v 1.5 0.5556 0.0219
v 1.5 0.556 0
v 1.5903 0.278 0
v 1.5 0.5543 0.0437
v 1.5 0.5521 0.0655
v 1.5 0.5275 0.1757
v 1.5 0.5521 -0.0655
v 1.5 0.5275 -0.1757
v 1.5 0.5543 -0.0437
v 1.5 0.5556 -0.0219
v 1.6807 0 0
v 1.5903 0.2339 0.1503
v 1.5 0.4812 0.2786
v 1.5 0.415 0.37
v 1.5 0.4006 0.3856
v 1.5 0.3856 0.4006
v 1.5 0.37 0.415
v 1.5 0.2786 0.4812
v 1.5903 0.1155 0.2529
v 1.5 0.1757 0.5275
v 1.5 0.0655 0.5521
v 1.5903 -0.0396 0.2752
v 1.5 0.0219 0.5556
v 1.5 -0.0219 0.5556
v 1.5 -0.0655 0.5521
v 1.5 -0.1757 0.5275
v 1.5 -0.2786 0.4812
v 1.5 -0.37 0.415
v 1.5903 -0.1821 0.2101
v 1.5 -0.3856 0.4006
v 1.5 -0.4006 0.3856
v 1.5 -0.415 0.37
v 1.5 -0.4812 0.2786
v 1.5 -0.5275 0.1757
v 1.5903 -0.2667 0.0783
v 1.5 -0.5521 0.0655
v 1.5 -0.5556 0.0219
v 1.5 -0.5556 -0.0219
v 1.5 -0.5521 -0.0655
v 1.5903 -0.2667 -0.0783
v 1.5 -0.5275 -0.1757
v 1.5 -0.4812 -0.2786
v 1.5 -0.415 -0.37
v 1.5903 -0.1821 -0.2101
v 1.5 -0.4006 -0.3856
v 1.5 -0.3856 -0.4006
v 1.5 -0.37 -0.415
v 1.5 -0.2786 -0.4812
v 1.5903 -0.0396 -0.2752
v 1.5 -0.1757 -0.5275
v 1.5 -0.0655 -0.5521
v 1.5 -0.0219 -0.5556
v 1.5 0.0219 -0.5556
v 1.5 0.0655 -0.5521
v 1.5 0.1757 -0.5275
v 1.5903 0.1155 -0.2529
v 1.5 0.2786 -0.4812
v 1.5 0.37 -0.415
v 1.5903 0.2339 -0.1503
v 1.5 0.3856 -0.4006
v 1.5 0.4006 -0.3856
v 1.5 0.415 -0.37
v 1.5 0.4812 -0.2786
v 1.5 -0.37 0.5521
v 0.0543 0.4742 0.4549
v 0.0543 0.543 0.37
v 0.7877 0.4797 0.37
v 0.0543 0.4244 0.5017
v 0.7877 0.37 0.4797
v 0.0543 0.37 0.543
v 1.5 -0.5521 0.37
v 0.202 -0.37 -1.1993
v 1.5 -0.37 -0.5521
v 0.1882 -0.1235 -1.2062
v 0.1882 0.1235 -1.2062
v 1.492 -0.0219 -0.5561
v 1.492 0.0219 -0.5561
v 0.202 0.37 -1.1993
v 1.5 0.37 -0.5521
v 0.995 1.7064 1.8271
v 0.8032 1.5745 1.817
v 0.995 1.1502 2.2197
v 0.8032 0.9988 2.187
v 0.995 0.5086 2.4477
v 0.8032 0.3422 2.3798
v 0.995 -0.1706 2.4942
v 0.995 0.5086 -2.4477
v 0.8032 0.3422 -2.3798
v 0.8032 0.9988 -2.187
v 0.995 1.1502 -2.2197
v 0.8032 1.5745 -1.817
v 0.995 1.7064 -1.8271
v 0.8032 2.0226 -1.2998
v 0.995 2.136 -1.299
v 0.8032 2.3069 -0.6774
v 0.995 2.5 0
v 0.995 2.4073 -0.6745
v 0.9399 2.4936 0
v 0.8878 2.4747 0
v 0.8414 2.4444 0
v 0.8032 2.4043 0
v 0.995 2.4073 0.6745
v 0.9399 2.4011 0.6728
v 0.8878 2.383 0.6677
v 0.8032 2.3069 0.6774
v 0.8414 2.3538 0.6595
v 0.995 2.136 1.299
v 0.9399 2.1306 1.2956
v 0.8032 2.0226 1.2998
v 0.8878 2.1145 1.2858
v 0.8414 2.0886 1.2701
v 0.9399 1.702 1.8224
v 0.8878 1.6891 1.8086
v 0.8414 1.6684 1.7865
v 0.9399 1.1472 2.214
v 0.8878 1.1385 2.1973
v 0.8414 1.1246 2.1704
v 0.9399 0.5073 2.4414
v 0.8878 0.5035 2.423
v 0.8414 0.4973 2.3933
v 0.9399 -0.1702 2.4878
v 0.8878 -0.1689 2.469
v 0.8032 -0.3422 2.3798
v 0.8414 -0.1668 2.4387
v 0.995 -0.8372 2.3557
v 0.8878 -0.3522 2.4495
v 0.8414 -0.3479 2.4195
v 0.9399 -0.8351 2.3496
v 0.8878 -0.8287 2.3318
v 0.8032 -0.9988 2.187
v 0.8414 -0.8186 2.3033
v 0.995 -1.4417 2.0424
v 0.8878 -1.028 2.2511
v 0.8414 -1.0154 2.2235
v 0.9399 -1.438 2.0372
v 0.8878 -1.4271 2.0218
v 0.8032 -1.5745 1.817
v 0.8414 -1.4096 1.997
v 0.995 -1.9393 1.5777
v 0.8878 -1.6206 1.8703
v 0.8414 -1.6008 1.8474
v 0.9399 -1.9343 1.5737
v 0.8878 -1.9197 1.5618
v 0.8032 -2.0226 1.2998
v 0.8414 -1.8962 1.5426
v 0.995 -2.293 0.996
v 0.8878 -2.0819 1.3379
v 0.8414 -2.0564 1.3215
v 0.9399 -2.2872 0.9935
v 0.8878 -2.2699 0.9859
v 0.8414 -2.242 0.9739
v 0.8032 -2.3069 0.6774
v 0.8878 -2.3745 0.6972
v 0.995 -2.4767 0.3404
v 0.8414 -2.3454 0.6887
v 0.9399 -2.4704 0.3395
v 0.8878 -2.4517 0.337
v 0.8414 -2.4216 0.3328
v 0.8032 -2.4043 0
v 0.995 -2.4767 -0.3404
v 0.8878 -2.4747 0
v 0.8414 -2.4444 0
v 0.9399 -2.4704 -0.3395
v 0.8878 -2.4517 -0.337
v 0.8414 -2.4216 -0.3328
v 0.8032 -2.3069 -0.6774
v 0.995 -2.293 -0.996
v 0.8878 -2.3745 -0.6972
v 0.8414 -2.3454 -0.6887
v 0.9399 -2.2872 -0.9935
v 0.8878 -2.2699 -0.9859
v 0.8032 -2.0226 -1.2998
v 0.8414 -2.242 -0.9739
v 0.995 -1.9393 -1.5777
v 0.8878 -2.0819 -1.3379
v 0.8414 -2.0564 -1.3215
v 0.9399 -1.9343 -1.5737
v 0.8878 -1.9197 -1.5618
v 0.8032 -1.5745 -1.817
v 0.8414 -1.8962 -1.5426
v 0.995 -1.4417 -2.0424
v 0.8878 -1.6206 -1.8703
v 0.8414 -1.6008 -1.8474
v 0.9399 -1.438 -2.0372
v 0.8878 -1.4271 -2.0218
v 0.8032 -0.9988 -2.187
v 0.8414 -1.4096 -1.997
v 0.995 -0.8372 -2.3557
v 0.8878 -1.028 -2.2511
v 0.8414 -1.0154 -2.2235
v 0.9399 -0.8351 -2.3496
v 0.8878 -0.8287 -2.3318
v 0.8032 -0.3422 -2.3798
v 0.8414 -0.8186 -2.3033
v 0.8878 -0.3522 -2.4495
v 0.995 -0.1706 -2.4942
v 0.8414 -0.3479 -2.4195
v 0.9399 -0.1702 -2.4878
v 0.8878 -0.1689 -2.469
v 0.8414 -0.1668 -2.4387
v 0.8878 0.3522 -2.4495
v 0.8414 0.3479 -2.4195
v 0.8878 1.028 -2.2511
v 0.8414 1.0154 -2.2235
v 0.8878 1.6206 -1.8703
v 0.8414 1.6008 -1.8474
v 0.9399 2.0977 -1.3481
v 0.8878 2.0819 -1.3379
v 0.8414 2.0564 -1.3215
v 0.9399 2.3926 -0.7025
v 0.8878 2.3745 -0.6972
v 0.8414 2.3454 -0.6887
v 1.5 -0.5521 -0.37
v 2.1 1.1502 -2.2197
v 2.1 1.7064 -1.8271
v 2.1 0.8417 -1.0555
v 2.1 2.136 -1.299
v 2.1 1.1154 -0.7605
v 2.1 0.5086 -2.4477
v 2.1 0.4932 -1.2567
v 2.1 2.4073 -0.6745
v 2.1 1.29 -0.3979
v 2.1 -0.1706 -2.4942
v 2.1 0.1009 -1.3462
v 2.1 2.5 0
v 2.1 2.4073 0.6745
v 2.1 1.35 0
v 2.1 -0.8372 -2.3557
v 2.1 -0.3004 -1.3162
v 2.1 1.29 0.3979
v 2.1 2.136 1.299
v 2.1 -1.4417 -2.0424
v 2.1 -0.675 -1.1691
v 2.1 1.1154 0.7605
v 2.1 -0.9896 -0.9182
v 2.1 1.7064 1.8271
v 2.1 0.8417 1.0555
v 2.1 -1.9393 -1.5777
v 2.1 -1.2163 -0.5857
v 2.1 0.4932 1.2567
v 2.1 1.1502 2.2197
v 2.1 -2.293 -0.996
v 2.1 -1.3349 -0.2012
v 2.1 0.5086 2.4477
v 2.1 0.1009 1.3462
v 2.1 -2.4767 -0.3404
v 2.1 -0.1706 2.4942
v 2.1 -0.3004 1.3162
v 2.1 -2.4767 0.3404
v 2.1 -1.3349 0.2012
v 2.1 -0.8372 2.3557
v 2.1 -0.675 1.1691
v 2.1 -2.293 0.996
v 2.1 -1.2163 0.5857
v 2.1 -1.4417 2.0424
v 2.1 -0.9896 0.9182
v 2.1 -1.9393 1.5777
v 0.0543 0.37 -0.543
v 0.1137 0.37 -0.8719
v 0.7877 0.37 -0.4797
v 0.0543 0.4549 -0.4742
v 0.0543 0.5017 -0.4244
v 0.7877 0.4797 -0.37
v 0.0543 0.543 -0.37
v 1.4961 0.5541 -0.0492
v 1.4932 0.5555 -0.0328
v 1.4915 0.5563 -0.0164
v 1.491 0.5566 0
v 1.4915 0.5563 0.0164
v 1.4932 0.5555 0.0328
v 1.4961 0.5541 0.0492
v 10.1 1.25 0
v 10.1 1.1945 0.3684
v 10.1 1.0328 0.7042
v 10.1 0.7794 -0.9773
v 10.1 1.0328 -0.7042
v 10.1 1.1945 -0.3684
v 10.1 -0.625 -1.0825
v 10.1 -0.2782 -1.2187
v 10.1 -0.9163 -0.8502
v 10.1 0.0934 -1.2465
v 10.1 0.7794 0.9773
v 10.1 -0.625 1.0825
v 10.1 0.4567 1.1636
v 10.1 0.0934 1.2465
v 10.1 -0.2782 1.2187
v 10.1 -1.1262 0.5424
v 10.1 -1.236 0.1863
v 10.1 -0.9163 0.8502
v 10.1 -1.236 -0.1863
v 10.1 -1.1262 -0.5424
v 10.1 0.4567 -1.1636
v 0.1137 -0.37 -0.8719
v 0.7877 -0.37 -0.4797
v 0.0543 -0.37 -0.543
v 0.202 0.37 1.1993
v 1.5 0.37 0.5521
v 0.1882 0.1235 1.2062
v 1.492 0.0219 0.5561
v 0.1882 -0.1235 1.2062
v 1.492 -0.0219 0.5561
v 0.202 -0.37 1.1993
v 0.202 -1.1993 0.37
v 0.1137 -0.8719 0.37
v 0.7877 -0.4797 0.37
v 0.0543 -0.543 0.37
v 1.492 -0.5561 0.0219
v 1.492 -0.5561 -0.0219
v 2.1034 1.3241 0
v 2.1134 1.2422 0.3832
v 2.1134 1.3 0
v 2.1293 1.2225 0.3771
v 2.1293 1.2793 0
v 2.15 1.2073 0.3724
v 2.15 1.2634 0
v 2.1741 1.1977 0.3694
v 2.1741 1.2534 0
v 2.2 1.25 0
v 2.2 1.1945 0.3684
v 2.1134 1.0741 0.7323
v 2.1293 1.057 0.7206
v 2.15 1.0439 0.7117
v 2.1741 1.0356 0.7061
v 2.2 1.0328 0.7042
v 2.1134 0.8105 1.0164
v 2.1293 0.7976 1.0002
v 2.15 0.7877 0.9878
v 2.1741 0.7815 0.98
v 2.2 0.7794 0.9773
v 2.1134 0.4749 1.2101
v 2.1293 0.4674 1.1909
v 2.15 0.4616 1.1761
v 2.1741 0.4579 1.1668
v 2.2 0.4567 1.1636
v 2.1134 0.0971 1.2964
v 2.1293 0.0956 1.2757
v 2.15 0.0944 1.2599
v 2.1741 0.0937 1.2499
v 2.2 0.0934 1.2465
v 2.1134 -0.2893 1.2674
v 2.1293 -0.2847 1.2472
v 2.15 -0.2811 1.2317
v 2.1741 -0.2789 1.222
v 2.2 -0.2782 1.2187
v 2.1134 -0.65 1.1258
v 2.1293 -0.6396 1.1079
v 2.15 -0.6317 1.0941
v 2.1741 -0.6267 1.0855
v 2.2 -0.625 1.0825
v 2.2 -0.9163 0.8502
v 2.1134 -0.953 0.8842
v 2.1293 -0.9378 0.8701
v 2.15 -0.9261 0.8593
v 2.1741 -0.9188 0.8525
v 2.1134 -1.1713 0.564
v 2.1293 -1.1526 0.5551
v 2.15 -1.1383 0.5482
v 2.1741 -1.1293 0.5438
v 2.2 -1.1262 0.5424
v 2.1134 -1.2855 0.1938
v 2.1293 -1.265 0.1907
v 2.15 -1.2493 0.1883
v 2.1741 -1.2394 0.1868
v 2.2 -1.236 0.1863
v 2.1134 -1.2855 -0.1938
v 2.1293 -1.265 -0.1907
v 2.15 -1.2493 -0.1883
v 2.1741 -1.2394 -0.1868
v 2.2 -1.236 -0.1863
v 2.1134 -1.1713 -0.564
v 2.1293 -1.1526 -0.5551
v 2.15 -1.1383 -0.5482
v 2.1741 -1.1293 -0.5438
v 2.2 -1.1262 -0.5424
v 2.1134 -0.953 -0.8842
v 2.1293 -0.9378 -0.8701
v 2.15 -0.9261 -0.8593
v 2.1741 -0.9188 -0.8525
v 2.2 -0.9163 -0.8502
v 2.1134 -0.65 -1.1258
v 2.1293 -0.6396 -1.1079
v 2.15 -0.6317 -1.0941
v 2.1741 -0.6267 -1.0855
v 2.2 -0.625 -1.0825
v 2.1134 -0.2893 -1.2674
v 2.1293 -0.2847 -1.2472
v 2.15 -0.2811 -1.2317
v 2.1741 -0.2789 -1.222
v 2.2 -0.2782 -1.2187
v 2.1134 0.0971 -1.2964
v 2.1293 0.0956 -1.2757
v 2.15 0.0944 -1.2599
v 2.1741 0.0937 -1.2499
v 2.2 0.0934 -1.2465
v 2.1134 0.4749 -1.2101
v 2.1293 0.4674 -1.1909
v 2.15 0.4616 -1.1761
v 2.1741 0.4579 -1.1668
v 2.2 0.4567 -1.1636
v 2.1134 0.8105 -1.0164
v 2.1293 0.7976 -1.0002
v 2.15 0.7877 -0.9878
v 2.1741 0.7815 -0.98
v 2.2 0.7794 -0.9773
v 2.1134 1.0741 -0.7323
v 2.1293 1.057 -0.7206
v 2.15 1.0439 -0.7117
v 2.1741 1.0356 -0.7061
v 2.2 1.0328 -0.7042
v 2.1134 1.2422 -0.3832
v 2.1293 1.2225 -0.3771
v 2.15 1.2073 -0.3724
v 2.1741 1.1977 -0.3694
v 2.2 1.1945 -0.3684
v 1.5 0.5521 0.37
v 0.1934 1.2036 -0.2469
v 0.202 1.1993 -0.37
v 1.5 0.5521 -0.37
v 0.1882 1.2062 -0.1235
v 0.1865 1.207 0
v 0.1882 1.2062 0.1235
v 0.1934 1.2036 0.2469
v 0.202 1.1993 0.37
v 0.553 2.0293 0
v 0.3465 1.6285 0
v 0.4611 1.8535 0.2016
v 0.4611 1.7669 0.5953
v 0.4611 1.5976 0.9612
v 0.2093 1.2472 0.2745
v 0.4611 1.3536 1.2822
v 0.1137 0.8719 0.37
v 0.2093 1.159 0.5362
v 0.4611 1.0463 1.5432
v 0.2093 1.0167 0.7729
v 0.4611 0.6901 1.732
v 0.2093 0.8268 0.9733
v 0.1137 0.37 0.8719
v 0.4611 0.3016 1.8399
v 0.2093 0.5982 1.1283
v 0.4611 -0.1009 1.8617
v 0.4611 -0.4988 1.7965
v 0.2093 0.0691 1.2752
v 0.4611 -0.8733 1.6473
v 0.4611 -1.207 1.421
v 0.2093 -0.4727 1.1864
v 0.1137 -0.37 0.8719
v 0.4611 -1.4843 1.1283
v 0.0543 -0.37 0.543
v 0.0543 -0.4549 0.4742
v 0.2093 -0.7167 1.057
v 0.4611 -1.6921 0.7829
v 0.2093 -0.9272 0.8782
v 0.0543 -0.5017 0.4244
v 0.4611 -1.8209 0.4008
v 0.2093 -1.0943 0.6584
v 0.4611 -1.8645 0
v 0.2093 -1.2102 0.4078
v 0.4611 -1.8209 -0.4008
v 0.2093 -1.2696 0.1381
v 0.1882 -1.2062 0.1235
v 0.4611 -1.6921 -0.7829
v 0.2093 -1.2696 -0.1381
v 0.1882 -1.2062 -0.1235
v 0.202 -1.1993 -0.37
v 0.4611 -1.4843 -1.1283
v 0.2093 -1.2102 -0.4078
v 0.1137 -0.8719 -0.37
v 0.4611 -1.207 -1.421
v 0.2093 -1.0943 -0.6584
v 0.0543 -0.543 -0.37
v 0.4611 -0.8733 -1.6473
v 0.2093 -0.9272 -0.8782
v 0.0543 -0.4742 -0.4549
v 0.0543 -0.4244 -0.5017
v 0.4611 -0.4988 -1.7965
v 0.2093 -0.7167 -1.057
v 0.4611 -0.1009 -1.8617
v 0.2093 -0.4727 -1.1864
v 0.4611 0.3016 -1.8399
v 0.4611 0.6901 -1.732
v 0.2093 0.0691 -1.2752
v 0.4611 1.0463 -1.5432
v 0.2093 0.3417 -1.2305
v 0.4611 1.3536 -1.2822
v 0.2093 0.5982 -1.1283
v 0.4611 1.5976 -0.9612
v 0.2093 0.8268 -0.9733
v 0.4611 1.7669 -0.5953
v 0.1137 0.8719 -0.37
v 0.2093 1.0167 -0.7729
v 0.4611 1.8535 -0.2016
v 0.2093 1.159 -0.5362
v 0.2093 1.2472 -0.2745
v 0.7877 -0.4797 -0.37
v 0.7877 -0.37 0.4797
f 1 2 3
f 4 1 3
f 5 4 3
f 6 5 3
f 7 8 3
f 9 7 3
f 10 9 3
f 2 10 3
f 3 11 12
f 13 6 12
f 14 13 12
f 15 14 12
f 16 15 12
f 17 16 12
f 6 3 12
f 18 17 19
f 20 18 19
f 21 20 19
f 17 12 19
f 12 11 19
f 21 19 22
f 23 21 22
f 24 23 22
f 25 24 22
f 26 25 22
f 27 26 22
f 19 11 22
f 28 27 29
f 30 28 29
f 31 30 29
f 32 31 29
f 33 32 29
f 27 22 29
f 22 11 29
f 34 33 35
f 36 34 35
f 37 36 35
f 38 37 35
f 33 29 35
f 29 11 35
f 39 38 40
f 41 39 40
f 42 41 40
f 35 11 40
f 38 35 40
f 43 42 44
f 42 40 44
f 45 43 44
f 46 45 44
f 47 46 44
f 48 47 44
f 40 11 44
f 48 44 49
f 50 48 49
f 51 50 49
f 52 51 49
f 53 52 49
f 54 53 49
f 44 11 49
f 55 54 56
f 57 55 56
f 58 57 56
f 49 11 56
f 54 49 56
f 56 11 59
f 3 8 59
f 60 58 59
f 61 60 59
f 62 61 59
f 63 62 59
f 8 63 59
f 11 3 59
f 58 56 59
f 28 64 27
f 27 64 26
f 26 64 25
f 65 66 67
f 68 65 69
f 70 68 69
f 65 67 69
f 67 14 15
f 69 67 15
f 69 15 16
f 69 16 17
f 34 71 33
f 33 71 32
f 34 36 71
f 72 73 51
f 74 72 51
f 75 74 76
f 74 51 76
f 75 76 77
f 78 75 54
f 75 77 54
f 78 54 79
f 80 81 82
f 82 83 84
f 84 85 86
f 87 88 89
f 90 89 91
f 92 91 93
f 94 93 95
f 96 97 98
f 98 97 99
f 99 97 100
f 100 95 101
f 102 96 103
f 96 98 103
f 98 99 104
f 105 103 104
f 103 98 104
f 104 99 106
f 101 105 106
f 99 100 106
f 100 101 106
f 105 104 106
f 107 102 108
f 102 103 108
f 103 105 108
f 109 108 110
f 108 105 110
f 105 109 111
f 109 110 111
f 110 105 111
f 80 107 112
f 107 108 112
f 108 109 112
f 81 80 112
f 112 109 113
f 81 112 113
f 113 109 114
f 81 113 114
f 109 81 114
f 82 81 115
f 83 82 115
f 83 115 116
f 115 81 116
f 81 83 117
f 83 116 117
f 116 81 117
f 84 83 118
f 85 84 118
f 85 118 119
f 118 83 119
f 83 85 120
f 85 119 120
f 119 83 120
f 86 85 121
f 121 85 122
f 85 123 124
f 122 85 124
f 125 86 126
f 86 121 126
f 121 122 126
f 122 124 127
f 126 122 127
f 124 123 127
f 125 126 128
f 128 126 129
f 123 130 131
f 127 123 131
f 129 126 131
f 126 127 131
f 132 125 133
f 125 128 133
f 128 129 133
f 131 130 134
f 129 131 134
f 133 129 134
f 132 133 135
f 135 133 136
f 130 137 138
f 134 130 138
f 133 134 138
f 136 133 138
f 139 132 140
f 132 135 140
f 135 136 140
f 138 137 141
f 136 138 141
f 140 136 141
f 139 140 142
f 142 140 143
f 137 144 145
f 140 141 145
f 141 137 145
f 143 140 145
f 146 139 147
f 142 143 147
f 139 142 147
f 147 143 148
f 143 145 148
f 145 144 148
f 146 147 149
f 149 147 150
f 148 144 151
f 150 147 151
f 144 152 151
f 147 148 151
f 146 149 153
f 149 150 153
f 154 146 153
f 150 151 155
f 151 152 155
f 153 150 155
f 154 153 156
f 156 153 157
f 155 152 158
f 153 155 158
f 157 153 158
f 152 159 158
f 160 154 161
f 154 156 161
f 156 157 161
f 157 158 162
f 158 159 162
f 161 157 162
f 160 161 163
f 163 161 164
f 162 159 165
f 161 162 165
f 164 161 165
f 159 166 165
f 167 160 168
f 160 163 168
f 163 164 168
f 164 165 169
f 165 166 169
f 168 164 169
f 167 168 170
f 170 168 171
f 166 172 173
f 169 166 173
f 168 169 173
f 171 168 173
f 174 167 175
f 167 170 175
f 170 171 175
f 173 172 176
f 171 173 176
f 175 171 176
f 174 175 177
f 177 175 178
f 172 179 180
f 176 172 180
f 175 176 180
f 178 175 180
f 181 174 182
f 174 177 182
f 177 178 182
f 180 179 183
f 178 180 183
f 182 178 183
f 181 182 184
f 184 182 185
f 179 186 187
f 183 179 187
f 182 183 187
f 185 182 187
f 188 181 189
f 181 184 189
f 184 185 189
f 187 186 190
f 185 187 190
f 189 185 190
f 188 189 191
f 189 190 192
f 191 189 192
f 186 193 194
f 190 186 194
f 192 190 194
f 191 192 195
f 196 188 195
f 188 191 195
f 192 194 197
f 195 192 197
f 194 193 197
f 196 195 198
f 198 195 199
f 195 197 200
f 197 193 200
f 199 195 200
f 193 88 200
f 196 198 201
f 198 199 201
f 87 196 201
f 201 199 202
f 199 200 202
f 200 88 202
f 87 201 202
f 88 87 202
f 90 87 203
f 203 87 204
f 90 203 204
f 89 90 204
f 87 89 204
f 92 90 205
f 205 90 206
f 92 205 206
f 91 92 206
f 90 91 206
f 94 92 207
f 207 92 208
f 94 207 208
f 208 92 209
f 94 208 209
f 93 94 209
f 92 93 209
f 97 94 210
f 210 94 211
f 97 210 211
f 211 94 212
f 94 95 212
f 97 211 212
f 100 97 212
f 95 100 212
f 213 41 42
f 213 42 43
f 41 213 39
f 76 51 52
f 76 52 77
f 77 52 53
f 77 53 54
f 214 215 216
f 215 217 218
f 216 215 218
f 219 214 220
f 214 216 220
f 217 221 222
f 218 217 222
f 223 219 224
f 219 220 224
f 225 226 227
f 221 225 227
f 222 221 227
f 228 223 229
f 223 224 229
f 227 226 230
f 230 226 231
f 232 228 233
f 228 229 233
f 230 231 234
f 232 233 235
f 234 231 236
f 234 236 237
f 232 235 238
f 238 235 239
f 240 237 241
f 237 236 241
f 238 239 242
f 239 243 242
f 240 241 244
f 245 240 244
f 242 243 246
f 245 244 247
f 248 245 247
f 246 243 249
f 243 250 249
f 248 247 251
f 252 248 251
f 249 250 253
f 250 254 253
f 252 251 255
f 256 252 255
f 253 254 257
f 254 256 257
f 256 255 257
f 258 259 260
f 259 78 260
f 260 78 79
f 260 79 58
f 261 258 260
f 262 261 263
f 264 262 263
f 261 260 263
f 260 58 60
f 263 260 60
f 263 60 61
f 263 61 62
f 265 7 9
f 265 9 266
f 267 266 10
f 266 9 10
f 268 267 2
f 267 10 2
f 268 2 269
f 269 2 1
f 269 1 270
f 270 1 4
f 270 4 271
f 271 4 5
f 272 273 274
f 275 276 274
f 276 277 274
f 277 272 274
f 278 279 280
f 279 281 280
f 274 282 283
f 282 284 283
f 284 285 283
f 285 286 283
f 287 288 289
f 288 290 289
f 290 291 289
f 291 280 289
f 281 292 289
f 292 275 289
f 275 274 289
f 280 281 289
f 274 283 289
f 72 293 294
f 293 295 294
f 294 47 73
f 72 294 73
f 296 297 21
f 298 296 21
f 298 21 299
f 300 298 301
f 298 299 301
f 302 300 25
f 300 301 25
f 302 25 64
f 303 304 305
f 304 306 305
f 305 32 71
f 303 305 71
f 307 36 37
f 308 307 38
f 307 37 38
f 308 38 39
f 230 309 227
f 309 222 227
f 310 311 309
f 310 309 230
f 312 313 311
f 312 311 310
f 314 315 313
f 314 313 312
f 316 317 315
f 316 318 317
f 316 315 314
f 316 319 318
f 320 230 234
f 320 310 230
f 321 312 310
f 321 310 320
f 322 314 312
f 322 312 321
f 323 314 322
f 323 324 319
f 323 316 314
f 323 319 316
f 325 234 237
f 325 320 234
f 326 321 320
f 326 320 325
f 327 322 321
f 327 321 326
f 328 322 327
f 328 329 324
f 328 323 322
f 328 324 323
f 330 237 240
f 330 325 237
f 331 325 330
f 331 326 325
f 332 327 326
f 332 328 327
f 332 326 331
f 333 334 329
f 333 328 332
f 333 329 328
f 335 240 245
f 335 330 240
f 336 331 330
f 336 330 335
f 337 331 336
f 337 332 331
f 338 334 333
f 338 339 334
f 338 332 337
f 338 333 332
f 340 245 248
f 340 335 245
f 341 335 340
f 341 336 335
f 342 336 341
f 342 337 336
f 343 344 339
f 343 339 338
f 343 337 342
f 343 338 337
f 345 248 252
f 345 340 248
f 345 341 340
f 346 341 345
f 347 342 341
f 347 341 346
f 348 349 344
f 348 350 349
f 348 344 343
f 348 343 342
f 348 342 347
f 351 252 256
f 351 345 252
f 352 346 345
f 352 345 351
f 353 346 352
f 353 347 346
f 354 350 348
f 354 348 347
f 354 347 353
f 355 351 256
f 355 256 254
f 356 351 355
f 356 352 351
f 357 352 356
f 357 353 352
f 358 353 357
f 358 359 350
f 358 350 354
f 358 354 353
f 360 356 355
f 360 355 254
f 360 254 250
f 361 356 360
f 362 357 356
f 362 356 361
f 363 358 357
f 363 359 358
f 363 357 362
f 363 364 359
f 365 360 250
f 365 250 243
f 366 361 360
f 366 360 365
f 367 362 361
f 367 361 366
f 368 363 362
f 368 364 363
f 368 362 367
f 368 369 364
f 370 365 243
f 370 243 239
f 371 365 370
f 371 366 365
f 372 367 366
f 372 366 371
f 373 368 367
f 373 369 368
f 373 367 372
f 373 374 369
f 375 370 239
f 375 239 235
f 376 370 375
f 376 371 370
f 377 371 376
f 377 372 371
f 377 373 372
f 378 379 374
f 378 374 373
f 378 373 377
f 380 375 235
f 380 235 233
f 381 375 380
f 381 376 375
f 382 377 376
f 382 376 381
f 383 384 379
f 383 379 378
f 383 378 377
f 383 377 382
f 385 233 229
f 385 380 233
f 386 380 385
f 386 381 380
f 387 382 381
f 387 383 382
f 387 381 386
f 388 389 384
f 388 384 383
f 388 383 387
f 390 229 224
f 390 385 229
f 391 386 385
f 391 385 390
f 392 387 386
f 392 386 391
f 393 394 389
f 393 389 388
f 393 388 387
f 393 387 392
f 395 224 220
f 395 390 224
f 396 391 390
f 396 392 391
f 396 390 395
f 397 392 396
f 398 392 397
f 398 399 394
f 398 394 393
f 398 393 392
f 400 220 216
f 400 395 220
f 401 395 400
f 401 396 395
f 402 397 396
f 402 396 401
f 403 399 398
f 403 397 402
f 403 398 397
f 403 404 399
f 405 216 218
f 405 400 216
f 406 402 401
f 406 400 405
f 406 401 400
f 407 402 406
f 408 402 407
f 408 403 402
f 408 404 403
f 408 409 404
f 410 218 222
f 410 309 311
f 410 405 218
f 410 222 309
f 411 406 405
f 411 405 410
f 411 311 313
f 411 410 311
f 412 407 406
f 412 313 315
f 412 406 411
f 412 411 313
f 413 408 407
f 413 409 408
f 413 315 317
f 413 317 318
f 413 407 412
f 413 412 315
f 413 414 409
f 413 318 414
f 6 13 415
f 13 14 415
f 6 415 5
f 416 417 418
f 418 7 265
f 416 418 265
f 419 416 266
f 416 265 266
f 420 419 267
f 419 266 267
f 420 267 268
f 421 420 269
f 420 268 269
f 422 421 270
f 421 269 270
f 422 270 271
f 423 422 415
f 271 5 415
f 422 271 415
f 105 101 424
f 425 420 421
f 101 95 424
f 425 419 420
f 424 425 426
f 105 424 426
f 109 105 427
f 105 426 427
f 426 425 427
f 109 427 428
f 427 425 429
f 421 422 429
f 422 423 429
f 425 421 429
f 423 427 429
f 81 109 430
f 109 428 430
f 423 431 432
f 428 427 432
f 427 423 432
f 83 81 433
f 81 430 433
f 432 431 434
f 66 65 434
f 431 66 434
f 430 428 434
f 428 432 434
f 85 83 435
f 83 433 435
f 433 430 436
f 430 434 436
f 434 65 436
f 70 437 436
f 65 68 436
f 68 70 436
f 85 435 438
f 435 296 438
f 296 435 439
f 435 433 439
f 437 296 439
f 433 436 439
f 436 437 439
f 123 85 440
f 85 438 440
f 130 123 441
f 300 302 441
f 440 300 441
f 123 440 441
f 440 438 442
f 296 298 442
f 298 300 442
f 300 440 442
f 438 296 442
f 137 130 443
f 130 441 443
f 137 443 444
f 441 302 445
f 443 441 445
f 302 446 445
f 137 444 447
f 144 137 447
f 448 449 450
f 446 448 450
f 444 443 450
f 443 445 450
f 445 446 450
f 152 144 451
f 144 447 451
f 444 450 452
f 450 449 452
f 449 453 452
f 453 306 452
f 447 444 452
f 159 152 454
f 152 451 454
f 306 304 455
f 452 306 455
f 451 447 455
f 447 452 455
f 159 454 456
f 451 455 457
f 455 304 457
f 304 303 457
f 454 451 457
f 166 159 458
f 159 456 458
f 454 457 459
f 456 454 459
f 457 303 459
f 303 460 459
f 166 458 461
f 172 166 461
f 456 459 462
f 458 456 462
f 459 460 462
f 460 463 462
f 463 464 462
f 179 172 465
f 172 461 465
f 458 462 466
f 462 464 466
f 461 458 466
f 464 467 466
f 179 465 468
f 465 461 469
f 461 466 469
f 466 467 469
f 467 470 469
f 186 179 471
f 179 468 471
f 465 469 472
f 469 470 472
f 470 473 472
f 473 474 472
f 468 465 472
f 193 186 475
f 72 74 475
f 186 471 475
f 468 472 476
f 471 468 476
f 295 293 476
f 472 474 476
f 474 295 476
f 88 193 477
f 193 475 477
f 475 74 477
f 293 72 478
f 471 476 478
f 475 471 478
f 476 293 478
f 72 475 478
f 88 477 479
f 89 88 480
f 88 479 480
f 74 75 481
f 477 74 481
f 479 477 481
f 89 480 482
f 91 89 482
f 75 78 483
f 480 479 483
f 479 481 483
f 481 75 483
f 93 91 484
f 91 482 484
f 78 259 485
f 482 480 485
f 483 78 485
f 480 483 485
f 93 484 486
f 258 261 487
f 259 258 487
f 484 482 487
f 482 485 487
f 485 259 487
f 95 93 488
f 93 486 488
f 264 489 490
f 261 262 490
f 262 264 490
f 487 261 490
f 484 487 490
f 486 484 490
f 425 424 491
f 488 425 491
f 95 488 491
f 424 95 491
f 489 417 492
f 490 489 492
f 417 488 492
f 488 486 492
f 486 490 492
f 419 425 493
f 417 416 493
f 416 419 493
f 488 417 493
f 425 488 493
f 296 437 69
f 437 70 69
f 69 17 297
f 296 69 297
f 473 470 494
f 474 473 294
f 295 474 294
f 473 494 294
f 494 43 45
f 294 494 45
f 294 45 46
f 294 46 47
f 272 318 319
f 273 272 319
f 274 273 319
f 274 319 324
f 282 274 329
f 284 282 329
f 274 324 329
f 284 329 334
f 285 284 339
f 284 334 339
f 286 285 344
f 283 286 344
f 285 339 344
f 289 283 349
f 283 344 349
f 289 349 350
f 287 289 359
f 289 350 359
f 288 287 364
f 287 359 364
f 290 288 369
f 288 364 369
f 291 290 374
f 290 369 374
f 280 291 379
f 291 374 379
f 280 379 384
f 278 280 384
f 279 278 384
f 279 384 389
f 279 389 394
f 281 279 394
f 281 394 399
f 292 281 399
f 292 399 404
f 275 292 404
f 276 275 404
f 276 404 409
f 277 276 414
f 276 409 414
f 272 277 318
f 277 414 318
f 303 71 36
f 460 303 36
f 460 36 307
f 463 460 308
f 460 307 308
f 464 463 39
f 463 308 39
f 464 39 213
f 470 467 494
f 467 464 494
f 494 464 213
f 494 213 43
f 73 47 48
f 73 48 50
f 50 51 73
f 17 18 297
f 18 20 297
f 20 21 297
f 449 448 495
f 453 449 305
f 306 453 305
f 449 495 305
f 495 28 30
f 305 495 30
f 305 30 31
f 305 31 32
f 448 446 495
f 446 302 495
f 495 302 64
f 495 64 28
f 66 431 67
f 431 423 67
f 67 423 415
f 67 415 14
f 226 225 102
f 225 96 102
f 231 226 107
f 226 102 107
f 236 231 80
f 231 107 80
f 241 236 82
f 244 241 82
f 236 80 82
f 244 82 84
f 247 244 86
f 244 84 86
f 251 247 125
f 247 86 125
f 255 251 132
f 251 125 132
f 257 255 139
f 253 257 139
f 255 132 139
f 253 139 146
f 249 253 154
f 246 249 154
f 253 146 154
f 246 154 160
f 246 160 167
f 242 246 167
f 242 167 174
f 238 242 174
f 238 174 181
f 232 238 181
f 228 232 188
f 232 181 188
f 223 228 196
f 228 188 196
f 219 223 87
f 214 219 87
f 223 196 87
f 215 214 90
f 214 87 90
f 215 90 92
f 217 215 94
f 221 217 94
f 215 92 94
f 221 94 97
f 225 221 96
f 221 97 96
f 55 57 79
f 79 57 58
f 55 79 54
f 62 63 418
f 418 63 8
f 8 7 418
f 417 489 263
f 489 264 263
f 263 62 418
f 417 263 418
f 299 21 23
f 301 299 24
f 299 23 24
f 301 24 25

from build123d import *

# Parameters (mm, degrees)
FILLET1_R    = 0.1
SKETCH3_W    = 0.74
SKETCH3_H    = 2.6
SKETCH4_W    = 0.74
SKETCH4_H    = 1.104255426
RECPAT_COUNT = 2
RECPAT_ANGLE = 90


with BuildPart() as part:
    # BodySke → Base-Revolve (revolve)
    with BuildSketch(Plane.XY):
        with BuildLine():
            Line((2.1, 1.25), (2.1, 2.5))
            Line((2.1, 2.5), (0.99500416, 2.5))
            ThreePointArc((0.99500416, 2.5), (0.88781572, 2.474733878), (0.803195915, 2.404255319))
            ThreePointArc((0.803195915, 2.404255319), (0.206109099, 1.267435138), (0, 0))
            Line((0, 0), (10.1, 0))
            Line((10.1, 0), (10.1, 1.25))
            Line((10.1, 1.25), (2.1, 1.25))
        make_face()
    revolve(axis=Axis((-25.4, 0, 0), (1, 0, 0)))

    # Fillet1
    fillet1_edges = [part.edges().sort_by_distance(p)[0] for p in [
        (2.1, -1.25, 0),
    ]]
    fillet(fillet1_edges, radius=FILLET1_R)

    # Sketch3 → Recess section 0
    with BuildSketch(Plane(origin=(0, 0, 0), x_dir=(0, 0, -1), z_dir=(1, 0, 0))):
        Rectangle(SKETCH3_W, SKETCH3_H)
    # Sketch4 → Recess section 1
    with BuildSketch(Plane(origin=(1.5, 0, 0), x_dir=(0, 0, -1), z_dir=(1, 0, 0))):
        Rectangle(SKETCH4_W, SKETCH4_H)
    recess = loft(mode=Mode.SUBTRACT)

    # RecPat: Recess ×2 about axis
    recpat_axis = Axis((0, 0, 0), (1, 0, 0))
    for i in range(1, RECPAT_COUNT):
        add(recess.rotate(recpat_axis, i * RECPAT_ANGLE / (RECPAT_COUNT - 1)), mode=Mode.SUBTRACT)

    # RecCorSke → RecessCore (revolve, cut)
    with BuildSketch(Plane.XY):
        Polygon((0, 0), (0, 0.660890218), (1.5, 0.556), (1.680655351, 0), align=None)
    revolve(axis=Axis((-3.175, 0, 0), (1, 0, 0)), mode=Mode.SUBTRACT)


solid = part.part
